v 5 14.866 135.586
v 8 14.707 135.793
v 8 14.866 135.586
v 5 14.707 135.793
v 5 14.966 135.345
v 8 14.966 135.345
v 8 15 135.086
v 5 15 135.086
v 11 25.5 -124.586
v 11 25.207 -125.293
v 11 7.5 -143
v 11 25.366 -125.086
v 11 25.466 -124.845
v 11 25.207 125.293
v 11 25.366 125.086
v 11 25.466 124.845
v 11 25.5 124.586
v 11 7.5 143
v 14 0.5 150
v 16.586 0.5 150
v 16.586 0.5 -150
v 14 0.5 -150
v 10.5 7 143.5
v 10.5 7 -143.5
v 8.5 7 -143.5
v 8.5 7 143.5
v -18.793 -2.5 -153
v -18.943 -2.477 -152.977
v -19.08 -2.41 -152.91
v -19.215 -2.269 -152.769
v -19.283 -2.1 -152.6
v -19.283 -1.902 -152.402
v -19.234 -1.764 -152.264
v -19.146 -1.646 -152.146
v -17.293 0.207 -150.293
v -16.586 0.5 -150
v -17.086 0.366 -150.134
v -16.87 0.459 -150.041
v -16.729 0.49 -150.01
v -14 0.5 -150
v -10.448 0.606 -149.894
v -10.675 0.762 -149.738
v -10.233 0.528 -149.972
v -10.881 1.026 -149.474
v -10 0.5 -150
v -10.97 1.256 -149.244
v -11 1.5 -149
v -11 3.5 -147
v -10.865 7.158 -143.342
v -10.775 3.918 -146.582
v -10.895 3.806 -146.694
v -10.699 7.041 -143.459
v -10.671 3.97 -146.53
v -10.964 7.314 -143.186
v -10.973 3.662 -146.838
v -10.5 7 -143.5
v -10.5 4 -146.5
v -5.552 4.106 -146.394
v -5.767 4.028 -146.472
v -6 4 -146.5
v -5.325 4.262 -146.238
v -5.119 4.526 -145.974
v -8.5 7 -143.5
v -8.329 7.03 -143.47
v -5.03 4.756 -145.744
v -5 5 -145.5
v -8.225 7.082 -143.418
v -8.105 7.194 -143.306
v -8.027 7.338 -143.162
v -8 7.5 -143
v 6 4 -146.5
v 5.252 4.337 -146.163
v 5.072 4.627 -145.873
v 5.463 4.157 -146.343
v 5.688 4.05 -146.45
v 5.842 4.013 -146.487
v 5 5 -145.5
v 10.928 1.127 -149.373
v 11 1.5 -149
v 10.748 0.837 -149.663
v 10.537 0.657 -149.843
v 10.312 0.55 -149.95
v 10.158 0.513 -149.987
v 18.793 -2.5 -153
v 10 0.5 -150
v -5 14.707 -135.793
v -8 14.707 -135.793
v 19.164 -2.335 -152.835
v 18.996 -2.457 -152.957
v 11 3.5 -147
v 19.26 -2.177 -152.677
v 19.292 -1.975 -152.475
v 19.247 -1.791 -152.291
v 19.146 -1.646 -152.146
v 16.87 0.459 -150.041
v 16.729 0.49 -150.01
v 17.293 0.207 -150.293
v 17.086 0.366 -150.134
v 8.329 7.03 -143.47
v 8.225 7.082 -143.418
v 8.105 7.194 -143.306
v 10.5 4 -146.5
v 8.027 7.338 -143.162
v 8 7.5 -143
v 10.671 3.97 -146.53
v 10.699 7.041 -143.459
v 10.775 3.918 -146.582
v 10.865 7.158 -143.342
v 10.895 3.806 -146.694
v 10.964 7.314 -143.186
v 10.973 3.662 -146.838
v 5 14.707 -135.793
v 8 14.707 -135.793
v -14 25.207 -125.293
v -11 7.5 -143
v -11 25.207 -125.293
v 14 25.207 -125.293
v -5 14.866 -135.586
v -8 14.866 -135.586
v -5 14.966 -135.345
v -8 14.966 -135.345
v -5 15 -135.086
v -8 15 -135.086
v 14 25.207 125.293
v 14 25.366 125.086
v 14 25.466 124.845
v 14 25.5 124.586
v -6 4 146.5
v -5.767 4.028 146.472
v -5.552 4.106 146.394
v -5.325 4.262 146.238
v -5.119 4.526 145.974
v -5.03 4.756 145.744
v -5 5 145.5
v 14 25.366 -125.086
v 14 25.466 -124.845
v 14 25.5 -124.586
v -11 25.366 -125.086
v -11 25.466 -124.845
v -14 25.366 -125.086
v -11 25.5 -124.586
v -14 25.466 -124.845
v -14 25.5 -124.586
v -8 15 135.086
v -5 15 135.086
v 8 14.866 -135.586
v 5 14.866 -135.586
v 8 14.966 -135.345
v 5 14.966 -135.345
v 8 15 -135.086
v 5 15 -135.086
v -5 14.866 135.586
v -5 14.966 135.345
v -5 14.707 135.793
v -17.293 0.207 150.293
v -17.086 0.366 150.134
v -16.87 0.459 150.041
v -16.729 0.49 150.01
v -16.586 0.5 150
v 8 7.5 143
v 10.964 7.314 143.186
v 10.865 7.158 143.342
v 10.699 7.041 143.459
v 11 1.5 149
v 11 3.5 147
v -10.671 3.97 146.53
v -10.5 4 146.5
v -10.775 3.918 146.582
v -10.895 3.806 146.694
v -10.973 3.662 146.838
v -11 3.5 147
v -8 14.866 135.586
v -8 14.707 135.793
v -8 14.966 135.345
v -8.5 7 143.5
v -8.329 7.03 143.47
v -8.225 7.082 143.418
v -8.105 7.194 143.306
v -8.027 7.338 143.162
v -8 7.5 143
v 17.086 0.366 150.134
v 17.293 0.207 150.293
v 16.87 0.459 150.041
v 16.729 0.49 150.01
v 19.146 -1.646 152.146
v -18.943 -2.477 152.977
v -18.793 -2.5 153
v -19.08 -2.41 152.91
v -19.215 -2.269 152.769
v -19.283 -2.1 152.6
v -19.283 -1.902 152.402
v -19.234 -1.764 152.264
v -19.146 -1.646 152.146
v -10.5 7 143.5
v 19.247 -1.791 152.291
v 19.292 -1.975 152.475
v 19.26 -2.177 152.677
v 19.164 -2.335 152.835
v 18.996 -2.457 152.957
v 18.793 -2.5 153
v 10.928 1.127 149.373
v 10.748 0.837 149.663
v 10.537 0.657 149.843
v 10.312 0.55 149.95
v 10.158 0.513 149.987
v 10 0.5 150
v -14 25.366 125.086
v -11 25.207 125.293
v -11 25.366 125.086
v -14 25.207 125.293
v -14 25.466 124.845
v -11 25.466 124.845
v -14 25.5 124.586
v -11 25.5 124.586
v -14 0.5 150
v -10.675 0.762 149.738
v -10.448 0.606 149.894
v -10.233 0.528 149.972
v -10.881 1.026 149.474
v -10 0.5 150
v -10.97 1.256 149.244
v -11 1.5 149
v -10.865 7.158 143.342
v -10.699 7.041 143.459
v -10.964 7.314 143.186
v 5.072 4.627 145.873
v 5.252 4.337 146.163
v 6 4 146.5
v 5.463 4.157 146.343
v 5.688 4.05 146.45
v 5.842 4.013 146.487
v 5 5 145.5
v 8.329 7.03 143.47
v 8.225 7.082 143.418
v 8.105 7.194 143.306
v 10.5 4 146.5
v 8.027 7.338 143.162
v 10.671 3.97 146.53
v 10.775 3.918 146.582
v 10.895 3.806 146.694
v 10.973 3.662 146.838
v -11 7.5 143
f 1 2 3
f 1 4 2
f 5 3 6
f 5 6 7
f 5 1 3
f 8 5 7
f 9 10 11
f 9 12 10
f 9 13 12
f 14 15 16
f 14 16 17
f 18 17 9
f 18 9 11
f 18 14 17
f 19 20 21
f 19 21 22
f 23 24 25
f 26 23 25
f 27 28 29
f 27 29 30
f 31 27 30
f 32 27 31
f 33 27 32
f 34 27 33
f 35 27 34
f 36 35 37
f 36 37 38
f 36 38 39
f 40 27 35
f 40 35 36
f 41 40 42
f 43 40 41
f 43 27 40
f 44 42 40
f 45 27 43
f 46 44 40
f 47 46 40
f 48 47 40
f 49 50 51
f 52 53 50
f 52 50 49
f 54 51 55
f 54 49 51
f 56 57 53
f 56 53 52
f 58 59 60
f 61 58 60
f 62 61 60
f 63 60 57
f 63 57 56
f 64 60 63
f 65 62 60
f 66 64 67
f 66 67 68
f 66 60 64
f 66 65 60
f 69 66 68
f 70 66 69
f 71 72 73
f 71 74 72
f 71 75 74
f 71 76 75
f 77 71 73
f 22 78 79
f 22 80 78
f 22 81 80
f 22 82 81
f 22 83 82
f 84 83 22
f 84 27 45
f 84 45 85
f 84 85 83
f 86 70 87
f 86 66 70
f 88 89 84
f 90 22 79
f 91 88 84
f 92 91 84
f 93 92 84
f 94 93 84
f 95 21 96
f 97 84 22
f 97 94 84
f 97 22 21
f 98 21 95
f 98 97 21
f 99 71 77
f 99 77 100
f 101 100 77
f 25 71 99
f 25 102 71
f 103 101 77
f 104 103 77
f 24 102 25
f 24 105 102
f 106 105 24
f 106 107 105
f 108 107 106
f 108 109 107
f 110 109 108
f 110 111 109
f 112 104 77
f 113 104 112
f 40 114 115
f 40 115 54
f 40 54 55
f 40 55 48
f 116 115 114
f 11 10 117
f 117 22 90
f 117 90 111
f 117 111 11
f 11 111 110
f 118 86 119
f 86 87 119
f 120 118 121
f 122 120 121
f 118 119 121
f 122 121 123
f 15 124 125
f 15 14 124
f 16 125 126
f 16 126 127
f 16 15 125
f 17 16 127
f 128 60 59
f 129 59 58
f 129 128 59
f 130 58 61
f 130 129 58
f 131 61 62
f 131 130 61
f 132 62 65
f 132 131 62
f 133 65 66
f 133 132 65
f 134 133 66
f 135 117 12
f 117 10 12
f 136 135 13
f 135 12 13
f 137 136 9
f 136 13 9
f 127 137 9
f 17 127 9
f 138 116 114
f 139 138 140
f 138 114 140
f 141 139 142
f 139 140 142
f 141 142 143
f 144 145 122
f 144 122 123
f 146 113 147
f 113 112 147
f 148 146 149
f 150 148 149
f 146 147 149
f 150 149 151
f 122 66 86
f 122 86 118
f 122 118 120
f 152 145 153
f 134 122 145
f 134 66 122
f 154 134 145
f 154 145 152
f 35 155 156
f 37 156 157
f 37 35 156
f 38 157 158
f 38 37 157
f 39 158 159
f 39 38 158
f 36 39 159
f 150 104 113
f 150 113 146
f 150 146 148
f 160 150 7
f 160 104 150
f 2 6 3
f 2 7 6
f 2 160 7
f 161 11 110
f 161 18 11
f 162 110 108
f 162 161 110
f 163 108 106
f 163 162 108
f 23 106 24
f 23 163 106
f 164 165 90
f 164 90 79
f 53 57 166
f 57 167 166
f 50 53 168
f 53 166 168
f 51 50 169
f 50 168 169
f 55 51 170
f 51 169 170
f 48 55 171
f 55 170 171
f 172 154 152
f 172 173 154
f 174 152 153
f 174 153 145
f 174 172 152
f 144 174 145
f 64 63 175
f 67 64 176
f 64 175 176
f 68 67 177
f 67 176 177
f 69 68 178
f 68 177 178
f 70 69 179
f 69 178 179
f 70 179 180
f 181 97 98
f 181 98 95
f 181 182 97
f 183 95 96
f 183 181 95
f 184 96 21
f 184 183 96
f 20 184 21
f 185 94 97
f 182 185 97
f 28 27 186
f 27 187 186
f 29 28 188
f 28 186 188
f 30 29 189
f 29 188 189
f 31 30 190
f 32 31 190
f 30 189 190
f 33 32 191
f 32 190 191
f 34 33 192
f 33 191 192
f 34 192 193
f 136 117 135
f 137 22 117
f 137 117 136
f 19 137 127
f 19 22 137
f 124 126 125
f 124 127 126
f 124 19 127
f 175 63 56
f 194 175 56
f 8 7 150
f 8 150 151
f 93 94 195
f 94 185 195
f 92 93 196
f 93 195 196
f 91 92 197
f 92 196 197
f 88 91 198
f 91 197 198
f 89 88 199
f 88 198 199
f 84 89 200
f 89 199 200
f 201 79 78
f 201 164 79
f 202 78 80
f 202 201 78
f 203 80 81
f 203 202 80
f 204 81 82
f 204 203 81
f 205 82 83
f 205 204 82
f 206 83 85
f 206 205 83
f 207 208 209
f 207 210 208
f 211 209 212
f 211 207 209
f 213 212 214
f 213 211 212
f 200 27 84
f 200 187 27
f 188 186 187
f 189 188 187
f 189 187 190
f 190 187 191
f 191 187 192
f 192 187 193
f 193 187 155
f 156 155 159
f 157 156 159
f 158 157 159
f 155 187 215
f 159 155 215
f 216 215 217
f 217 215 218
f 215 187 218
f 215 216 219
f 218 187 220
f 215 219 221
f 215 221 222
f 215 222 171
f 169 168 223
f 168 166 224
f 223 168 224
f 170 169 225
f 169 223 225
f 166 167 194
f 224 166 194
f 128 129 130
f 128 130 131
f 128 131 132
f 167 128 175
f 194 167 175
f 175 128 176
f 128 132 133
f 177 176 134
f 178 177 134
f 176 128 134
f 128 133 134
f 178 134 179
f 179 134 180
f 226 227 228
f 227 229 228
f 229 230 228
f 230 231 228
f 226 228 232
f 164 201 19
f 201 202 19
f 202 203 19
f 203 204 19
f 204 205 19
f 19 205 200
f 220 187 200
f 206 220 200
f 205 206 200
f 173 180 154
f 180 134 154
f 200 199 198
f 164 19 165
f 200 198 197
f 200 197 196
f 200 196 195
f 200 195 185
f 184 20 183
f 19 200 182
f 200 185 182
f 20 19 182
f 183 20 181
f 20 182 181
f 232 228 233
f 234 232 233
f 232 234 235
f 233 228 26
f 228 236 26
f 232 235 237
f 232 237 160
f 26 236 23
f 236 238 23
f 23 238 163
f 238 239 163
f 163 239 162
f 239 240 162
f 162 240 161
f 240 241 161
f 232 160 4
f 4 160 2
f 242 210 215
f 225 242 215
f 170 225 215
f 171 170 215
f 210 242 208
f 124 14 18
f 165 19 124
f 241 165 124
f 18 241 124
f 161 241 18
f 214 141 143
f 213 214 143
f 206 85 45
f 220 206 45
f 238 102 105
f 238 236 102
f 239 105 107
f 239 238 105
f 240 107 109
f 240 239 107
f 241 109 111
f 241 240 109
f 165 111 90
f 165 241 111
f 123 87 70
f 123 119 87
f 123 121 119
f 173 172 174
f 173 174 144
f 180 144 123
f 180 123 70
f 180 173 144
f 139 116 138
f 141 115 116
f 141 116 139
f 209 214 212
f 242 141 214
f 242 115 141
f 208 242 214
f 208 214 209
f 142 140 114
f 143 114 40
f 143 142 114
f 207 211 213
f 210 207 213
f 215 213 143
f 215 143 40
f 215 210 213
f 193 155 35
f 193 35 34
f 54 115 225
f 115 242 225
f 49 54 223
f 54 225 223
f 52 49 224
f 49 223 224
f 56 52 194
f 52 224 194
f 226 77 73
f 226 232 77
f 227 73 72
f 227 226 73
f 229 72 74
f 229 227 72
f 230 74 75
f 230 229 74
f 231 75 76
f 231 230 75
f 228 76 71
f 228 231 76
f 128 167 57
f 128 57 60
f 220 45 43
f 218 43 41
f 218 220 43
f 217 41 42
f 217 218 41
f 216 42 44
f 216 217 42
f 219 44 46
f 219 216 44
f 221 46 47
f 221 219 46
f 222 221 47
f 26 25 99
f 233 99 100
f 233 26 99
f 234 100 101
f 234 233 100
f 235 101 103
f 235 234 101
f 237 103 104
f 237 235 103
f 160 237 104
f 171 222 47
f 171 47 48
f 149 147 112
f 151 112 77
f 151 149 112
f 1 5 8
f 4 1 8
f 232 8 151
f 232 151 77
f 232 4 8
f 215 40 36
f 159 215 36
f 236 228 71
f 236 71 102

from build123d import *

# Parameters (mm, degrees)
F1_DEPTH = 153
F3_DEPTH = 30
F4_R     = 1
F6_R     = 0.5
F7_R     = 0.5


# Not quite as in the source:
# - two fillets or chamfers of one size are made in one step
# - a pattern or mirror of a feature is missing from the dataset's text; its kind, count and spacing are read off the source's solid


with BuildPart() as f1:
    # F0 (on Top) → F1 (new body, symmetric)
    with BuildSketch(Plane.XY):
        Polygon((-14, 0.5), (-17, 0.5), (-20, -2.5), (20, -2.5), (17, 0.5), (14, 0.5), (11, 0.5), (-11, 0.5), align=None)
        Polygon((-14, 25.5), (-14, 0.5), (-11, 0.5), (-11, 4), (-11, 7), (-11, 25.5), align=None)
        Polygon((11, 4), (11, 0.5), (14, 0.5), (14, 25.5), (11, 25.5), (11, 7), align=None)
        Polygon((-11, 7), (-11, 4), (-5, 4), (-5, 7), (-5, 15), (-8, 15), (-8, 7), align=None)
        Polygon((5, 4), (11, 4), (11, 7), (8, 7), (8, 15), (5, 15), (5, 7), align=None)
    extrude(amount=F1_DEPTH, both=True)

    # F2 (on Right) → F3 (cut, symmetric)
    with BuildSketch(Plane.YZ):
        Polygon((25.5, 153), (0.5, 153), (-2.5, 153), (25.5, 125), align=None)
    f3 = extrude(amount=F3_DEPTH, both=True, mode=Mode.SUBTRACT)

    # F3_copies: F3 across plane
    add(f3.mirror(Plane(origin=(0, 0, 0), x_dir=(-1, 0, 0), z_dir=(0, 0, -1))), mode=Mode.SUBTRACT)

    # F4
    f4_edges = [f1.edges().sort_by_distance(p)[0] for p in [
        (17, 0.5, 0),
        (12.5, 25.5, 125),
        (-11, 0.5, 0),
        (-12.5, 25.5, 125),
        (-17, 0.5, 0),
        (11, 0.5, 0),
        (6.5, 15, 135.5),
        (-6.5, 15, 135.5),
        (12.5, 25.5, -125),
        (6.5, 15, -135.5),
        (-6.5, 15, -135.5),
        (-12.5, 25.5, -125),
        (5, 4, 0),
        (-5, 4, 0),
    ]]
    fillet(f4_edges, radius=F4_R)

    # F6
    f6_edges = [f1.edges().sort_by_distance(p)[0] for p in [
        (-8, 7, 0),
        (-11, 7, 0),
        (-11, 4, 0),
        (11, 4, 0),
        (11, 7, 0),
        (8, 7, 0),
    ]]
    fillet(f6_edges, radius=F6_R)

    # F7
    f7_edges = [f1.edges().sort_by_distance(p)[0] for p in [
        (20, -2.5, 0),
        (-20, -2.5, 0),
    ]]
    fillet(f7_edges, radius=F7_R)


solid = f1.part
